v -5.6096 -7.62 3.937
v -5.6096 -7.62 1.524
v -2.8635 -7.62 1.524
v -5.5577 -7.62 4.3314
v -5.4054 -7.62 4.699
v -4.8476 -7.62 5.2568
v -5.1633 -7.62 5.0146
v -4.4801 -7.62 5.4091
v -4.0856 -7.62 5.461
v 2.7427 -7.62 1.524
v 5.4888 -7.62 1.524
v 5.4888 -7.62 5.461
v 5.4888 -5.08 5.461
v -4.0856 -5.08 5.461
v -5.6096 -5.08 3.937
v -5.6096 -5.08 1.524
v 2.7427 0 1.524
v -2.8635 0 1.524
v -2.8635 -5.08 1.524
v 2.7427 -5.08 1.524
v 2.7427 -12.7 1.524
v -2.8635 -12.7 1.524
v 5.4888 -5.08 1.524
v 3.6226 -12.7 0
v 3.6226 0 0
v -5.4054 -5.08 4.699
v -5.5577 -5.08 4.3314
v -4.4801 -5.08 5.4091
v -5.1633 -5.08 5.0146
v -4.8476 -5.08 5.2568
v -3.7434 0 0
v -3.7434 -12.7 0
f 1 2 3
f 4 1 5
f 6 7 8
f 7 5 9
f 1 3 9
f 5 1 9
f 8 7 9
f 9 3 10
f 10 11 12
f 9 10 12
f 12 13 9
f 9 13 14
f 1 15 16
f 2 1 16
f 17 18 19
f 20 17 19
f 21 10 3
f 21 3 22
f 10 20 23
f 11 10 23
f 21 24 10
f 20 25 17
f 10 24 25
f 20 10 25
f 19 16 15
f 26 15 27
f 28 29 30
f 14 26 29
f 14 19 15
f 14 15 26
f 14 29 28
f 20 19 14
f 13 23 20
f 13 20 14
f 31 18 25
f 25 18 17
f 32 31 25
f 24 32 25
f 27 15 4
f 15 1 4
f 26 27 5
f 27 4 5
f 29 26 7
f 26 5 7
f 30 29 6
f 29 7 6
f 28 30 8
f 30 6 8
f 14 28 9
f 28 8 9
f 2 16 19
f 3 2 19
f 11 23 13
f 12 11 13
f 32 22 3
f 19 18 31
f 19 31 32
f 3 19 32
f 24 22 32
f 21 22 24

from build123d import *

# Parameters (mm, degrees)
F1_DEPTH = 12.7
F2_W     = 2.54
F2_H     = 3.937
F3_DEPTH = 25.4
F4_R     = 1.524


with BuildPart() as f1:
    # F0 (on Front) → F1 (new body)
    with BuildSketch(Plane.XZ):
        Polygon((-2.863529, 1.524), (-3.743411, 0), (3.622589, 0), (2.742708, 1.524), (5.488804, 1.524), (5.488804, 5.461), (-5.609625, 5.461), (-5.609625, 1.524), align=None)
    extrude(amount=F1_DEPTH)

    # F2 (on face) → F3 (intersect)
    with BuildSketch(Plane.YZ.offset(5.488804)):
        with Locations((-6.35, 3.4925)):
            Rectangle(F2_W, F2_H)
        Polygon((-7.62, 1.524), (-12.7, 1.524), (-12.7, 0), (0, 0), (0, 1.524), (-5.08, 1.524), align=None)
    extrude(amount=-F3_DEPTH, mode=Mode.INTERSECT)

    # F4
    f4_edges = [f1.edges().sort_by_distance(p)[0] for p in [
        (-5.609625, -6.35, 5.461),
    ]]
    fillet(f4_edges, radius=F4_R)


solid = f1.part
